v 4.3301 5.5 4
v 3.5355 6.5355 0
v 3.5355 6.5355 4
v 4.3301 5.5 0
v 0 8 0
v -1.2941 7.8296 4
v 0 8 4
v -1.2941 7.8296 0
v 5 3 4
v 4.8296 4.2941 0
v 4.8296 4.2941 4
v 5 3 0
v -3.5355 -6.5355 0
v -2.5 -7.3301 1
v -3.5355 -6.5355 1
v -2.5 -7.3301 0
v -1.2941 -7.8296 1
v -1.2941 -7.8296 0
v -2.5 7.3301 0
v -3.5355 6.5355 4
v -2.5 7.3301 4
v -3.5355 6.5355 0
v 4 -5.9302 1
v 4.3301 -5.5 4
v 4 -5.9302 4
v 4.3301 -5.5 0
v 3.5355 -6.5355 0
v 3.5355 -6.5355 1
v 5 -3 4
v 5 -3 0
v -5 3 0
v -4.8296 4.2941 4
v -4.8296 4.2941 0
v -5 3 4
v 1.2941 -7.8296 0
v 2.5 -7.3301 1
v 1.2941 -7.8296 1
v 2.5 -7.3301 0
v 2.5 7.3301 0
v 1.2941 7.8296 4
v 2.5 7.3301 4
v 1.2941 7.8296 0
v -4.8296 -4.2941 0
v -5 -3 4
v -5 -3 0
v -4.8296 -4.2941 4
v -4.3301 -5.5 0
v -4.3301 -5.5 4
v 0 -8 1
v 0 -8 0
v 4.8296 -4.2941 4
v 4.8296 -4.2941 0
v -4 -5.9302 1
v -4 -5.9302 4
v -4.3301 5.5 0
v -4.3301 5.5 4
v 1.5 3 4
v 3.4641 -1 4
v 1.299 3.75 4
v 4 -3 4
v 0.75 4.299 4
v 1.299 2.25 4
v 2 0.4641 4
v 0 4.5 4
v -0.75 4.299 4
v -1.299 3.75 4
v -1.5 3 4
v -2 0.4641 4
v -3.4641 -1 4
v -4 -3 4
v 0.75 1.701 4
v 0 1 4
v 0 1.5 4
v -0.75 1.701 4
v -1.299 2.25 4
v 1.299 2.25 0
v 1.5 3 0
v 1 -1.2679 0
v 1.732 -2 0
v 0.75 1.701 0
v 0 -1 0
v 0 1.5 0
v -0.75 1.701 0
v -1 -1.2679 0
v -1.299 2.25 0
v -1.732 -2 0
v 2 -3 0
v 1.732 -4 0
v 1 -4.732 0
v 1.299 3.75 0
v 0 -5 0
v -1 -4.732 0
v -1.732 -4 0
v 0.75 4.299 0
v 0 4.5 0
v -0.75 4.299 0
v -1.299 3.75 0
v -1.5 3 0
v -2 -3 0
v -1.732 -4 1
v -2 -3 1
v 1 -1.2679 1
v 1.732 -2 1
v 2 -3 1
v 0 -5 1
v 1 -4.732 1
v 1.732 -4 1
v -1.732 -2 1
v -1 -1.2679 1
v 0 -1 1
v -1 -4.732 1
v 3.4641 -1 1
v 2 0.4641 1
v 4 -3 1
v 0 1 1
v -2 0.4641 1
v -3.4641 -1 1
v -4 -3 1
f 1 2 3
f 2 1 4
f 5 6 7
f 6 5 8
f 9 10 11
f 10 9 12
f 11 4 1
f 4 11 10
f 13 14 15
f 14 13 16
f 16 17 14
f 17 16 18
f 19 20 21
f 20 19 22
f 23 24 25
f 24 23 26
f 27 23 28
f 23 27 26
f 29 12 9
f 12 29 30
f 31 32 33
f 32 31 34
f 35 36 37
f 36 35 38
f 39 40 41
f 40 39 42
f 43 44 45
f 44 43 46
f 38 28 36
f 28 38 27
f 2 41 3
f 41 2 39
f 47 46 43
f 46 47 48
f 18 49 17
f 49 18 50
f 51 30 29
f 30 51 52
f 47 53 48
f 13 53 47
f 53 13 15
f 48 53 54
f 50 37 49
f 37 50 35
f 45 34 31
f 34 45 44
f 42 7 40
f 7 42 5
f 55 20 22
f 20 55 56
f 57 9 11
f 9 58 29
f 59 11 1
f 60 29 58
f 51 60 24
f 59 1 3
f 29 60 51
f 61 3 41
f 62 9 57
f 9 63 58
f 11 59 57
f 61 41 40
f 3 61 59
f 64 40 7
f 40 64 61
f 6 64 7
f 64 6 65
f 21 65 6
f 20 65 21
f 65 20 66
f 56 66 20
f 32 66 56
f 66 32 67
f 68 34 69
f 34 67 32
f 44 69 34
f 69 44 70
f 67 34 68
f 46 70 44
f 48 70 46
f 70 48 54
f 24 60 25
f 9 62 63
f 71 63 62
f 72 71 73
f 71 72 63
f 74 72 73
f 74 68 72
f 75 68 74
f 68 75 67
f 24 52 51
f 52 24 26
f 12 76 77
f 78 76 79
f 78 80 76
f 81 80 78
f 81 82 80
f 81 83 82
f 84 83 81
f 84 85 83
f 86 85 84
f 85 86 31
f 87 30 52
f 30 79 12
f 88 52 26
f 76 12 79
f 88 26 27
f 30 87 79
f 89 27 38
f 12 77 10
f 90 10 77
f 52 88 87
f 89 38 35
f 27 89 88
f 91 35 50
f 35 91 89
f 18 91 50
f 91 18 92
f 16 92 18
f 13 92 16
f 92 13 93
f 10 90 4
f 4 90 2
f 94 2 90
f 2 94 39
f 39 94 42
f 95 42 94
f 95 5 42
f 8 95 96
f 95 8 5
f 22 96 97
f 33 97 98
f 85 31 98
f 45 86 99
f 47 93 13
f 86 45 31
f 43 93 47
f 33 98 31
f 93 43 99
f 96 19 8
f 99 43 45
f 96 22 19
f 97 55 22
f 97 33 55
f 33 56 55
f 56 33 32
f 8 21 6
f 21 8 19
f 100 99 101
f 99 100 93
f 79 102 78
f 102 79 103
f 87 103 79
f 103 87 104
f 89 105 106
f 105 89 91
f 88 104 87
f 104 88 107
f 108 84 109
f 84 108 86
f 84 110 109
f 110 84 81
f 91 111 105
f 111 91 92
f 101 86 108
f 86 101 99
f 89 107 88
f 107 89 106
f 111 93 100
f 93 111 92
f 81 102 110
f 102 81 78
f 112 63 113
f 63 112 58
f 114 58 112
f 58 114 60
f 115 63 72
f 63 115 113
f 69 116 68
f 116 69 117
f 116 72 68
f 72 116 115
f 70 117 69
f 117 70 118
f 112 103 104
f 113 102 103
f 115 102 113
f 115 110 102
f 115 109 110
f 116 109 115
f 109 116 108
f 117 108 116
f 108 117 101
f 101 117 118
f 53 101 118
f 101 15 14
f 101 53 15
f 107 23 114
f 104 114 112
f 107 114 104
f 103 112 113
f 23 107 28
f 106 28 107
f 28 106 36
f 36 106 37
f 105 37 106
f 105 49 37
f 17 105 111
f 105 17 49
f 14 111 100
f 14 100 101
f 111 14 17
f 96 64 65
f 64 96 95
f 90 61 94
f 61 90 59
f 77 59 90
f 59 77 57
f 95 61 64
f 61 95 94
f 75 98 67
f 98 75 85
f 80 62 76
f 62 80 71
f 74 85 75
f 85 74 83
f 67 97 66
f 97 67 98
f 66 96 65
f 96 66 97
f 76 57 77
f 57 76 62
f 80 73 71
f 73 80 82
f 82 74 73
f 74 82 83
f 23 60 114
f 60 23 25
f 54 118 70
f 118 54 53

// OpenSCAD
// file: ../OpenSCAD_Modules/cube_vround.scad
module cube_vround(
	size=[10,10,10],
	round_corners=[true,true,true,true],
	rounding=3,
	center_xy=false,
	center_z=false,
	attach=0,
	wall_attach=0,
	quality=2, //integer from 1 to infinity
)
{
	assert(len(size)==3);
	assert(len(round_corners)==4);
	assert(rounding>0);
	assert(rounding<=size[0]/2);
	assert(rounding<=size[1]/2);
	assert(quality>0);
	assert(attach>=0);
	assert(wall_attach>=0);
	height=size[2]+attach;
	cyl_r=rounding+wall_attach;
	cyl_mvx=size[0]/2-rounding;
	cyl_mvy=size[1]/2-rounding;
	cube_szx=size[0]/2;
	cube_szy=size[1]/2;
	cube_mvx=cube_szx/2+wall_attach;
	cube_mvy=cube_szy/2+wall_attach;
	translate([center_xy?0:cube_szx,center_xy?0:cube_szy,center_z?-attach/2:(size[2]-attach)/2])
		hull()
		{
			if(round_corners[0])
				translate([cyl_mvx,cyl_mvy])
					cylinder(r=cyl_r,h=height,$fn=12*quality,center=true);
			else
				translate([cube_mvx,cube_mvy])
					cube([cube_szx,cube_szy,height],center=true);
			if(round_corners[1])
				translate([cyl_mvx,-cyl_mvy])
					cylinder(r=cyl_r,h=height,$fn=12*quality,center=true);
			else
				translate([cube_mvx,-cube_mvy])
					cube([cube_szx,cube_szy,height],center=true);
			if(round_corners[2])
				translate([-cyl_mvx,-cyl_mvy])
					cylinder(r=cyl_r,h=height,$fn=12*quality,center=true);
			else
				translate([-cube_mvx,-cube_mvy])
					cube([cube_szx,cube_szy,height],center=true);
			if(round_corners[3])
				translate([-cyl_mvx,cyl_mvy])
					cylinder(r=cyl_r,h=height,$fn=12*quality,center=true);
			else
				translate([-cube_mvx,cube_mvy])
					cube([cube_szx,cube_szy,height],center=true);
		};
}

//example
cube_vround(round_corners=[true,false,true,false],
size=[10,20,6],
attach=0.1,
wall_attach=0.1,
rounding=3,
center_xy=true,center_z=false);
// main file
use <../OpenSCAD_Modules/cube_vround.scad>

module hdd_clip2(
	height=4,
	quality=2, //integer from 1 to infinity
)
{
	difference()
	{
		cube_vround(size=[10,16,height],rounding=5,center_xy=true,quality=quality);
		translate([0,-3,-0.1])
			cylinder(d=4,h=height+0.2,$fn=6*quality);
		translate([0,-3,1])
			cylinder(d=8,h=height,$fn=6*quality);
		translate([0,3,-0.1])
			cylinder(d=3,h=height+0.2,$fn=6*quality);
	}
}

module hdd_clip2_alt(
	height=4,
	quality=2, //integer from 1 to infinity
)
{
	difference()
	{
		hdd_clip2(height=height,quality=quality);
		translate([0,-7,height/2+1])
			cube([8,8,height],center=true);
	}
}

//hdd_clip2();
hdd_clip2_alt();
